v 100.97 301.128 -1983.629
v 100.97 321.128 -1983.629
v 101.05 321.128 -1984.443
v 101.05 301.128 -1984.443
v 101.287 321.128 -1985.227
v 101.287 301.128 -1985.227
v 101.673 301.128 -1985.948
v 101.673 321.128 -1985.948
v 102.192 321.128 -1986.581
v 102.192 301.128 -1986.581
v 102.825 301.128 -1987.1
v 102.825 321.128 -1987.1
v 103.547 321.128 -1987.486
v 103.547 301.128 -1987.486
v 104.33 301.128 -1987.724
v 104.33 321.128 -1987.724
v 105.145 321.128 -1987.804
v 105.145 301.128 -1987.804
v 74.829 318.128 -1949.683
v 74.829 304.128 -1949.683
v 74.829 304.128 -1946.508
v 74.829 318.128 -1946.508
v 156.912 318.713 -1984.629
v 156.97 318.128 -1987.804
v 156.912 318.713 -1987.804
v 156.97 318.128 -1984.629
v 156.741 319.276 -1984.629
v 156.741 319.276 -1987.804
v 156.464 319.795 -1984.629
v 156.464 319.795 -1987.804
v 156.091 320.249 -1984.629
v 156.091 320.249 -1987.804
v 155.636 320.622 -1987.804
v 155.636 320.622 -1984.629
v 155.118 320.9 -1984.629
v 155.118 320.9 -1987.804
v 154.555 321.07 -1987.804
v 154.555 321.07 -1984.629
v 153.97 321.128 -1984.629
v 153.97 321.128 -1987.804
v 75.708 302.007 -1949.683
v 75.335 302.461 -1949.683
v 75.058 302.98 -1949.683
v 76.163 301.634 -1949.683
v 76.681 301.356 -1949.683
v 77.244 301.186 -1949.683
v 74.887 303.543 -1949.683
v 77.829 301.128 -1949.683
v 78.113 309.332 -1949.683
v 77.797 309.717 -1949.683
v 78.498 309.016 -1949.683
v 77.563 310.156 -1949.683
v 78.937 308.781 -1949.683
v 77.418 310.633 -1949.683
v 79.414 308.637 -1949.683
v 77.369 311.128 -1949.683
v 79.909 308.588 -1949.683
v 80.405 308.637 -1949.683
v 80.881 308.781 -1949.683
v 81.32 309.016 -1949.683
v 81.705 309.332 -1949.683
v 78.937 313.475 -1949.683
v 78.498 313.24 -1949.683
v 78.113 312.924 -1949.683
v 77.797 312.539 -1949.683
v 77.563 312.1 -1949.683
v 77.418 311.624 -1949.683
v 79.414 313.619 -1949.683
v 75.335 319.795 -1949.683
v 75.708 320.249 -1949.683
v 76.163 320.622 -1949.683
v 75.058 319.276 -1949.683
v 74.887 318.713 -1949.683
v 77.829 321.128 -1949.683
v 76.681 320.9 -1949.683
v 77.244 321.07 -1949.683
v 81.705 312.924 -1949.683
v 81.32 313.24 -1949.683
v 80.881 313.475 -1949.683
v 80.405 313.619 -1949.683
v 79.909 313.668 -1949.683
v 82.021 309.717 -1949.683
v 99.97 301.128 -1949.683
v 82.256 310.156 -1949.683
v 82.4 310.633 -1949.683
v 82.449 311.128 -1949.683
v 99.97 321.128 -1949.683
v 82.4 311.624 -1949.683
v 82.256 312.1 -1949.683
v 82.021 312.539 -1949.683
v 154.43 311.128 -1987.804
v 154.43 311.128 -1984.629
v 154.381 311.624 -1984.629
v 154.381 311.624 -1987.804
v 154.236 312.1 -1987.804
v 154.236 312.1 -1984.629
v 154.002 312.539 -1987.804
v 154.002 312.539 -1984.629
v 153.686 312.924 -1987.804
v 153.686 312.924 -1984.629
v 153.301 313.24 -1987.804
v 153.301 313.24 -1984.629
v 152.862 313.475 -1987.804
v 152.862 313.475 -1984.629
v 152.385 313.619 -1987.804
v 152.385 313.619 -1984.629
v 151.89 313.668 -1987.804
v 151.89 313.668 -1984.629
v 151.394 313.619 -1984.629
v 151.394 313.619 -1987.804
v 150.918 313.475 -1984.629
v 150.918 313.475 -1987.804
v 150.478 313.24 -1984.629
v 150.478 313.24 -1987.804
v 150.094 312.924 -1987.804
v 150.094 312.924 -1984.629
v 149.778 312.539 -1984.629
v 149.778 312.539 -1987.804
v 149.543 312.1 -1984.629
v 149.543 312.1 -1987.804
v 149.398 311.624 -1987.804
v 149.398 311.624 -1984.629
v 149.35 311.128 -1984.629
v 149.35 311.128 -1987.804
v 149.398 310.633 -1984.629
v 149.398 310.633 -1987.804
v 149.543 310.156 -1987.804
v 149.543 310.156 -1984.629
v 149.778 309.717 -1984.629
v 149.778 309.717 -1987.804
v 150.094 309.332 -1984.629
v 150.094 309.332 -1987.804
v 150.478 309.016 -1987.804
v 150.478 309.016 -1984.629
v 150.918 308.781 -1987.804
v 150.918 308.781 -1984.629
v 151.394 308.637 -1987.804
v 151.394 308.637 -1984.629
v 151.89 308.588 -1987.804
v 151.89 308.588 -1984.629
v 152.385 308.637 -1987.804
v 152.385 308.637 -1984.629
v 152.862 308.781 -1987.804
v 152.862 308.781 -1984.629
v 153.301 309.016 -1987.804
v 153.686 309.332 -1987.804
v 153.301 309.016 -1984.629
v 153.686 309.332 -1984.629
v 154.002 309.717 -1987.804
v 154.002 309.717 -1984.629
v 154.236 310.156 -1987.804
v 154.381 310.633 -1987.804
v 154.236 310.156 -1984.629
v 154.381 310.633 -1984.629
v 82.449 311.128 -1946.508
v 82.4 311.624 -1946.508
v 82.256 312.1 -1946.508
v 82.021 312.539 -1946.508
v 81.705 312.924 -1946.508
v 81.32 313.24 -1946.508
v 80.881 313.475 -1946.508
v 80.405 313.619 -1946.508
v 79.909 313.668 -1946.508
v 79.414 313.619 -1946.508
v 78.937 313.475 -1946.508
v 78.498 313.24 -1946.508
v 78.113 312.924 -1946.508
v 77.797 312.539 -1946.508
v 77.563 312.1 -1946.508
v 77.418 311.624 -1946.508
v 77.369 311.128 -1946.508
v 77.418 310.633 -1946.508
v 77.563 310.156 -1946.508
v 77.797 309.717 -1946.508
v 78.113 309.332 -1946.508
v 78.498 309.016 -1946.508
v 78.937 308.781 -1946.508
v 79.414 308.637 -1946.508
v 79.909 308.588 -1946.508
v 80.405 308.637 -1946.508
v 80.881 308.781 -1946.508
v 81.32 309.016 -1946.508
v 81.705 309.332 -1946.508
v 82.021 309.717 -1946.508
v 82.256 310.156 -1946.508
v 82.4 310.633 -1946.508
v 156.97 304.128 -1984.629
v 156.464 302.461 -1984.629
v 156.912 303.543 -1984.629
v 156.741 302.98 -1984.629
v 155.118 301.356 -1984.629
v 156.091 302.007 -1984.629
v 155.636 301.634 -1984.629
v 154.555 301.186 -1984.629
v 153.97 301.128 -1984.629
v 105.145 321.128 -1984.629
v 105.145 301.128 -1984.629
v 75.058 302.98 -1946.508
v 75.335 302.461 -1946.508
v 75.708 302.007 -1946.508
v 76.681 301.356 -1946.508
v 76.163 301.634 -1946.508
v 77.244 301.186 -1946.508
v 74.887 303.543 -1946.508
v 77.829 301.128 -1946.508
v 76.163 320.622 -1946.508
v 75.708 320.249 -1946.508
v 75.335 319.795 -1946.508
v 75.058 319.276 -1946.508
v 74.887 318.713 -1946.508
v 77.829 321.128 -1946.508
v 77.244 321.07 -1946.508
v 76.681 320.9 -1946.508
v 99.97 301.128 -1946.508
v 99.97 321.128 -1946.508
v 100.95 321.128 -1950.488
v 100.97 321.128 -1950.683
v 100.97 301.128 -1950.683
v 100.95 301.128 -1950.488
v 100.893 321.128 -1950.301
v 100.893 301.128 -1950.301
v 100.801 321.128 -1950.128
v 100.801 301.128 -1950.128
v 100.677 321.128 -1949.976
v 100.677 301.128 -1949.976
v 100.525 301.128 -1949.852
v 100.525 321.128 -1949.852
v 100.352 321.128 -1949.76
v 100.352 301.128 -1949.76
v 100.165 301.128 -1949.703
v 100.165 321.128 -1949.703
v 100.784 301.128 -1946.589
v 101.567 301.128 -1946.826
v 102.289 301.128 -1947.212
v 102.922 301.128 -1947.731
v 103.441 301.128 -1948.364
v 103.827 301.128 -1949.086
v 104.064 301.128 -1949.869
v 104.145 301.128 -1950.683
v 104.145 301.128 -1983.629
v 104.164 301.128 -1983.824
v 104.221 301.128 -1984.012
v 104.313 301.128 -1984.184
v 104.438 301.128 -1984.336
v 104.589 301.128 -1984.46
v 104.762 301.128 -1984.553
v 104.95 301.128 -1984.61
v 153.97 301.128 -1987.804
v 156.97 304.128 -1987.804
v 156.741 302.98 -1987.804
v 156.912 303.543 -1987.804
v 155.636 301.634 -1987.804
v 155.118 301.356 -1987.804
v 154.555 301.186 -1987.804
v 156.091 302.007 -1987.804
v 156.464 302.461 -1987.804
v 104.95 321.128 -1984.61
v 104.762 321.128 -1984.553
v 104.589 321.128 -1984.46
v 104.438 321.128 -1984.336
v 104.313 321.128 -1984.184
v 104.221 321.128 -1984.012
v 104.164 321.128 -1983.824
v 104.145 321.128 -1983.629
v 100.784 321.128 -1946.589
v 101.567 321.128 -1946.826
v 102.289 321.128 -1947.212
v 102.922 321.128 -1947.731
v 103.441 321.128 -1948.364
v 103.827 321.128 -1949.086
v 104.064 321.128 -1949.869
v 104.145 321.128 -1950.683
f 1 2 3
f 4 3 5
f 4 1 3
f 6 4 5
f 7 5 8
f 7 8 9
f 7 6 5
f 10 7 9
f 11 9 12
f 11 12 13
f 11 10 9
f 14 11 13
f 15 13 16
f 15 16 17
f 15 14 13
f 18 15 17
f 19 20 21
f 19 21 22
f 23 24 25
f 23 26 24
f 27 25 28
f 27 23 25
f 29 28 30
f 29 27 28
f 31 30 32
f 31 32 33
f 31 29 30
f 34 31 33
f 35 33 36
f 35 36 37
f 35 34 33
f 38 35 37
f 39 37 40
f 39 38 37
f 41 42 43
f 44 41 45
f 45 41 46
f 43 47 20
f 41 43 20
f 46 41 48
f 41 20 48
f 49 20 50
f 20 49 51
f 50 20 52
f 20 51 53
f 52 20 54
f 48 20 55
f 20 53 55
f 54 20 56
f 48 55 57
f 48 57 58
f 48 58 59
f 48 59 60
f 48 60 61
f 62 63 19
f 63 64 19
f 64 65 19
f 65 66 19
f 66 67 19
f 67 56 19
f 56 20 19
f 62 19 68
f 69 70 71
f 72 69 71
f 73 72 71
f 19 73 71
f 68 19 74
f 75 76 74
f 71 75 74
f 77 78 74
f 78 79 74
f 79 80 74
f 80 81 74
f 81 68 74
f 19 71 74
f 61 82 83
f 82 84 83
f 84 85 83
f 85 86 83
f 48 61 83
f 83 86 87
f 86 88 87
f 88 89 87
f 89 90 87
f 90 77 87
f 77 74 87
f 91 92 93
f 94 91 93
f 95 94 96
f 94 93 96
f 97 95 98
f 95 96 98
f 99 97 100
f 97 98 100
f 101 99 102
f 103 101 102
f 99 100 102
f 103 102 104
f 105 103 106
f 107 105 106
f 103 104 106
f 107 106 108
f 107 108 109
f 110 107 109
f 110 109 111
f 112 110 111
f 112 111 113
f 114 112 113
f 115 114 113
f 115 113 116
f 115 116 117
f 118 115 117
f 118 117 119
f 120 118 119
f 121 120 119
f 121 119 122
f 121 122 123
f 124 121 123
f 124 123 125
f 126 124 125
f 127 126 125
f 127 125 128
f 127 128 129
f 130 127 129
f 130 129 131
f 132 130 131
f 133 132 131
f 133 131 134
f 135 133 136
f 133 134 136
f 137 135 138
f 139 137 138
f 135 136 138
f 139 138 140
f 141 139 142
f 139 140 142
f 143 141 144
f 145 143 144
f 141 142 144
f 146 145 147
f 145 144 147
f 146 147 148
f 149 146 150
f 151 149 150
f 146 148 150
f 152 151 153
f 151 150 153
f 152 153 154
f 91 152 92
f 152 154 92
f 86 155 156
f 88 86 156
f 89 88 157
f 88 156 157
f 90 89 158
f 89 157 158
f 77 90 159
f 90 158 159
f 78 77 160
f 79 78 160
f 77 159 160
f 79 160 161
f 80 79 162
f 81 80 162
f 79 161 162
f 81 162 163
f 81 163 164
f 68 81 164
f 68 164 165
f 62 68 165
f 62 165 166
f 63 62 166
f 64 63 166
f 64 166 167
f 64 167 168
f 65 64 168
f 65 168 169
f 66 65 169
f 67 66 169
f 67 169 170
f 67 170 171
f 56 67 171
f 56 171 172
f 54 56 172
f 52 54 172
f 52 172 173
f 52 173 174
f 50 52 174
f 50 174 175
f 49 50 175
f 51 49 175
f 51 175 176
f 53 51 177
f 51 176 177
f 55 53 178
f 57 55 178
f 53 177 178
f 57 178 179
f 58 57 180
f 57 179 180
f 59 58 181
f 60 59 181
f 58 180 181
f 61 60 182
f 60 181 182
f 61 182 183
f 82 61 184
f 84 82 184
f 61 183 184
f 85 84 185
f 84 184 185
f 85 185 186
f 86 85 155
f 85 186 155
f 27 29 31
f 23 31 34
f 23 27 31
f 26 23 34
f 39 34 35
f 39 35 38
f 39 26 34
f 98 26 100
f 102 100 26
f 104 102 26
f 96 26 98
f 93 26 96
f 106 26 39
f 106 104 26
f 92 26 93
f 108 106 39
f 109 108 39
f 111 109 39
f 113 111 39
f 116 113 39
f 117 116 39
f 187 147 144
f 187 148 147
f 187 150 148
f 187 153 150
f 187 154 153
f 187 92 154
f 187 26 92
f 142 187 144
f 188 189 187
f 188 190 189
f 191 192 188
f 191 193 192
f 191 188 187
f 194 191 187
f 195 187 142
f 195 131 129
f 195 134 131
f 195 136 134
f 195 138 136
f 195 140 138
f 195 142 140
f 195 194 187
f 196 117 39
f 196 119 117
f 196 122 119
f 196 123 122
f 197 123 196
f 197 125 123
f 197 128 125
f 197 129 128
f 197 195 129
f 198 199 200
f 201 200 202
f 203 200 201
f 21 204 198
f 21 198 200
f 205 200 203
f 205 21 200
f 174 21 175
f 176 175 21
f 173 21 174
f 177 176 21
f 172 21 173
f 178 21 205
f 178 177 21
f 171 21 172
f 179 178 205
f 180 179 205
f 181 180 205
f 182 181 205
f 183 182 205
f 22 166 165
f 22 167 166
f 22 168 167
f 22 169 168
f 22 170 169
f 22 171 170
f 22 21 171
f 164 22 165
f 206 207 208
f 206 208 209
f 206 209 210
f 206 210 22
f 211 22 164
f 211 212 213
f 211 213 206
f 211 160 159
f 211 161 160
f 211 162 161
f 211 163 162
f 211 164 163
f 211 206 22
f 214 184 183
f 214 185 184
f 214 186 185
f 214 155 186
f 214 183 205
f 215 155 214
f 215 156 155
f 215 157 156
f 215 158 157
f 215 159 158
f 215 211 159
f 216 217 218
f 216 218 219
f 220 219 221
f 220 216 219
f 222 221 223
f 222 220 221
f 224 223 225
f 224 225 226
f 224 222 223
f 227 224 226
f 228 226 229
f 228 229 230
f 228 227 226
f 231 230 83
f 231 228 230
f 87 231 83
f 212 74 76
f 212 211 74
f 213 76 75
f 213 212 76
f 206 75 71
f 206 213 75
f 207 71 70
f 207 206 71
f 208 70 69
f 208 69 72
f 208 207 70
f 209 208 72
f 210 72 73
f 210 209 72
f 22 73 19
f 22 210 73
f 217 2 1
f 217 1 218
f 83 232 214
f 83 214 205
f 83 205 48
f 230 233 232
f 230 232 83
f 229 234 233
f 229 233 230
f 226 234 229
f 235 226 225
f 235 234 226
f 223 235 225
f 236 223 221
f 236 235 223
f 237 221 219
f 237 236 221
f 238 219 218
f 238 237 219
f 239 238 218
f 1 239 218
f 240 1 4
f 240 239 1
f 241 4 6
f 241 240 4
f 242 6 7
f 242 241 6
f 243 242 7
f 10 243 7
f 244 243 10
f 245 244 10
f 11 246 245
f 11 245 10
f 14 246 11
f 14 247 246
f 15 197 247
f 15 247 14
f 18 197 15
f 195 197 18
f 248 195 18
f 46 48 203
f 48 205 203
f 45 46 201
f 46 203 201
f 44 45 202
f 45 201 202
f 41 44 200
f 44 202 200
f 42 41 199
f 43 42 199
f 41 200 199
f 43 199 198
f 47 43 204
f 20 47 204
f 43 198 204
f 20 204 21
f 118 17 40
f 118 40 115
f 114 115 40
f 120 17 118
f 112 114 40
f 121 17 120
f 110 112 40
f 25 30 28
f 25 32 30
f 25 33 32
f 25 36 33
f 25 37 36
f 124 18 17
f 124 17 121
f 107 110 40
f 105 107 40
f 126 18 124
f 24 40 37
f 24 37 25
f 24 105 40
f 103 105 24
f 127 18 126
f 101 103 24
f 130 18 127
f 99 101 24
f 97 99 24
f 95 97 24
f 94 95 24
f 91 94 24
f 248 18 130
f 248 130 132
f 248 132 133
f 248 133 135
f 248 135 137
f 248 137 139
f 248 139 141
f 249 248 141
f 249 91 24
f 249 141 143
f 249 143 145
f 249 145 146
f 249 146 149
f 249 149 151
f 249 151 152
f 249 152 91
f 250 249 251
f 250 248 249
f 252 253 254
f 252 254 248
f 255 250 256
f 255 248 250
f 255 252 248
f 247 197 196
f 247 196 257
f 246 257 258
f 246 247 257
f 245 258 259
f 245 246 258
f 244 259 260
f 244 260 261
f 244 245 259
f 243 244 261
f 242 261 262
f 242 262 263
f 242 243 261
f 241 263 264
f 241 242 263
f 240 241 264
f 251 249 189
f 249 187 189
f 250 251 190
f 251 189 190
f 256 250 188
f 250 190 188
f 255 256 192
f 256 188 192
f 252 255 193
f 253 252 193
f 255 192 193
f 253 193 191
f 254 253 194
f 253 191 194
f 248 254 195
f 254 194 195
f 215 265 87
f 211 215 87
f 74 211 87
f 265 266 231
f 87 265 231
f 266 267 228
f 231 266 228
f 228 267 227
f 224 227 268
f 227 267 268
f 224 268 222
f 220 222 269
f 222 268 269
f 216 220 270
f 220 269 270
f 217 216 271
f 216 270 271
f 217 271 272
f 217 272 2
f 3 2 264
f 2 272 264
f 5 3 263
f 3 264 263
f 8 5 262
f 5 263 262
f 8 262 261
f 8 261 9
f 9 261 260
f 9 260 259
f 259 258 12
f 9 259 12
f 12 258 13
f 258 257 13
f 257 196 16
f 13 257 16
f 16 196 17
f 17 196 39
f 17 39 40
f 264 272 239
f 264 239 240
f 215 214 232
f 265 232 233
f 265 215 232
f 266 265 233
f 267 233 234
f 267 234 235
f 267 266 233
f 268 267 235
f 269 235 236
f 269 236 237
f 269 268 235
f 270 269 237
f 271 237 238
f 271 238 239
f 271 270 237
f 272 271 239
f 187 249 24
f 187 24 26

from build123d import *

# Parameters (mm, degrees)
SKETCH1_W                    = 26.140328994
SKETCH1_H                    = 20
BASE_FLANGE1_DEPTH           = 3.175
EDGE_FLANGE1_STRIP_W         = 14.7
EDGE_FLANGE1_STRIP_H         = 3.175
EDGE_FLANGE1_STRIP_CUT_DEPTH = 20
EDGE_FLANGE1_DEPTH           = 20
EDGE_FLANGE2_STRIP_W         = 14.7
EDGE_FLANGE2_STRIP_H         = 3.175
EDGE_FLANGE2_STRIP_CUT_DEPTH = 20
EDGE_FLANGE2_DEPTH           = 20
FILLET1_R                    = 3
SKETCH18_R                   = 2.54
CUT_EXTRUDE2_DEPTH           = 360.816616057
SKETCH19_R                   = 2.54
CUT_EXTRUDE3_DEPTH           = 360.466065193


# Sheet-metal steps are written as plain solids
with BuildPart() as part:
    # Sketch1 → Base-Flange1 (new body)
    with BuildSketch(Plane.XY.offset(-1949.683434301)):
        with Locations((87.899449082, 311.128054742)):
            Rectangle(SKETCH1_W, SKETCH1_H)
    extrude(amount=BASE_FLANGE1_DEPTH)

    # Edge-Flange1 strip (across the edge) → Edge-Flange1 strip cut (cut)
    with BuildSketch(Plane(origin=(100.969613579, 321.128054742, -1949.683434301), x_dir=(-1, 0, 0), z_dir=(0, -1, 0))):
        with Locations((-6.35, -1.5875)):
            Rectangle(EDGE_FLANGE1_STRIP_W, EDGE_FLANGE1_STRIP_H)
    extrude(amount=EDGE_FLANGE1_STRIP_CUT_DEPTH, mode=Mode.SUBTRACT)

    # Edge-Flange1 section (across the edge) → Edge-Flange1 (add)
    with BuildSketch(Plane(origin=(100.969613579, 321.128054742, -1949.683434301), x_dir=(-1, 0, 0), z_dir=(0, -1, 0))):
        with BuildLine():
            Line((-3.175, 1), (-3.175, 34.9454))
            Line((-3.175, 34.9454), (0, 34.9454))
            Line((0, 34.9454), (0, 1))
            ThreePointArc((0, 1), (0.292893219, 0.292893219), (1, 0))
            Line((1, 0), (1, -3.175))
            ThreePointArc((1, -3.175), (-1.952170811, -1.952170811), (-3.175, 1))
        make_face()
    extrude(amount=EDGE_FLANGE1_DEPTH)

    # Edge-Flange2 strip (across the edge) → Edge-Flange2 strip cut (cut)
    with BuildSketch(Plane(origin=(104.144613579, 301.128054742, -1984.628834301), x_dir=(0, 0, 1), z_dir=(0, 1, 0))):
        with Locations((-6.35, -1.5875)):
            Rectangle(EDGE_FLANGE2_STRIP_W, EDGE_FLANGE2_STRIP_H)
    extrude(amount=EDGE_FLANGE2_STRIP_CUT_DEPTH, mode=Mode.SUBTRACT)

    # Edge-Flange2 section (across the edge) → Edge-Flange2 (add)
    with BuildSketch(Plane(origin=(104.144613579, 301.128054742, -1984.628834301), x_dir=(0, 0, 1), z_dir=(0, 1, 0))):
        with BuildLine():
            Line((-3.175, 1), (-3.175, 52.825))
            Line((-3.175, 52.825), (0, 52.825))
            Line((0, 52.825), (0, 1))
            ThreePointArc((0, 1), (0.292893219, 0.292893219), (1, 0))
            Line((1, 0), (1, -3.175))
            ThreePointArc((1, -3.175), (-1.952170811, -1.952170811), (-3.175, 1))
        make_face()
    extrude(amount=EDGE_FLANGE2_DEPTH)

    # Fillet1
    fillet1_edges = [part.edges().sort_by_distance(p)[0] for p in [
        (156.969613579, 301.128054742, -1986.216334301),
        (156.969613579, 321.128054742, -1986.216334301),
        (74.829284585, 301.128054742, -1948.095934301),
        (74.829284585, 321.128054742, -1948.095934301),
    ]]
    fillet(fillet1_edges, radius=FILLET1_R)

    # Sketch18 → Cut-Extrude2 (cut, through all)
    with BuildSketch(Plane.XY.offset(-1946.508434301)):
        with Locations((79.909284585, 311.128054742)):
            Circle(SKETCH18_R)
    extrude(amount=-CUT_EXTRUDE2_DEPTH, mode=Mode.SUBTRACT)

    # Sketch19 → Cut-Extrude3 (cut, through all)
    with BuildSketch(Plane.XY.offset(-1984.628834301)):
        with Locations((151.889613579, 311.128054742)):
            Circle(SKETCH19_R)
    extrude(amount=-CUT_EXTRUDE3_DEPTH, mode=Mode.SUBTRACT)


solid = part.part
